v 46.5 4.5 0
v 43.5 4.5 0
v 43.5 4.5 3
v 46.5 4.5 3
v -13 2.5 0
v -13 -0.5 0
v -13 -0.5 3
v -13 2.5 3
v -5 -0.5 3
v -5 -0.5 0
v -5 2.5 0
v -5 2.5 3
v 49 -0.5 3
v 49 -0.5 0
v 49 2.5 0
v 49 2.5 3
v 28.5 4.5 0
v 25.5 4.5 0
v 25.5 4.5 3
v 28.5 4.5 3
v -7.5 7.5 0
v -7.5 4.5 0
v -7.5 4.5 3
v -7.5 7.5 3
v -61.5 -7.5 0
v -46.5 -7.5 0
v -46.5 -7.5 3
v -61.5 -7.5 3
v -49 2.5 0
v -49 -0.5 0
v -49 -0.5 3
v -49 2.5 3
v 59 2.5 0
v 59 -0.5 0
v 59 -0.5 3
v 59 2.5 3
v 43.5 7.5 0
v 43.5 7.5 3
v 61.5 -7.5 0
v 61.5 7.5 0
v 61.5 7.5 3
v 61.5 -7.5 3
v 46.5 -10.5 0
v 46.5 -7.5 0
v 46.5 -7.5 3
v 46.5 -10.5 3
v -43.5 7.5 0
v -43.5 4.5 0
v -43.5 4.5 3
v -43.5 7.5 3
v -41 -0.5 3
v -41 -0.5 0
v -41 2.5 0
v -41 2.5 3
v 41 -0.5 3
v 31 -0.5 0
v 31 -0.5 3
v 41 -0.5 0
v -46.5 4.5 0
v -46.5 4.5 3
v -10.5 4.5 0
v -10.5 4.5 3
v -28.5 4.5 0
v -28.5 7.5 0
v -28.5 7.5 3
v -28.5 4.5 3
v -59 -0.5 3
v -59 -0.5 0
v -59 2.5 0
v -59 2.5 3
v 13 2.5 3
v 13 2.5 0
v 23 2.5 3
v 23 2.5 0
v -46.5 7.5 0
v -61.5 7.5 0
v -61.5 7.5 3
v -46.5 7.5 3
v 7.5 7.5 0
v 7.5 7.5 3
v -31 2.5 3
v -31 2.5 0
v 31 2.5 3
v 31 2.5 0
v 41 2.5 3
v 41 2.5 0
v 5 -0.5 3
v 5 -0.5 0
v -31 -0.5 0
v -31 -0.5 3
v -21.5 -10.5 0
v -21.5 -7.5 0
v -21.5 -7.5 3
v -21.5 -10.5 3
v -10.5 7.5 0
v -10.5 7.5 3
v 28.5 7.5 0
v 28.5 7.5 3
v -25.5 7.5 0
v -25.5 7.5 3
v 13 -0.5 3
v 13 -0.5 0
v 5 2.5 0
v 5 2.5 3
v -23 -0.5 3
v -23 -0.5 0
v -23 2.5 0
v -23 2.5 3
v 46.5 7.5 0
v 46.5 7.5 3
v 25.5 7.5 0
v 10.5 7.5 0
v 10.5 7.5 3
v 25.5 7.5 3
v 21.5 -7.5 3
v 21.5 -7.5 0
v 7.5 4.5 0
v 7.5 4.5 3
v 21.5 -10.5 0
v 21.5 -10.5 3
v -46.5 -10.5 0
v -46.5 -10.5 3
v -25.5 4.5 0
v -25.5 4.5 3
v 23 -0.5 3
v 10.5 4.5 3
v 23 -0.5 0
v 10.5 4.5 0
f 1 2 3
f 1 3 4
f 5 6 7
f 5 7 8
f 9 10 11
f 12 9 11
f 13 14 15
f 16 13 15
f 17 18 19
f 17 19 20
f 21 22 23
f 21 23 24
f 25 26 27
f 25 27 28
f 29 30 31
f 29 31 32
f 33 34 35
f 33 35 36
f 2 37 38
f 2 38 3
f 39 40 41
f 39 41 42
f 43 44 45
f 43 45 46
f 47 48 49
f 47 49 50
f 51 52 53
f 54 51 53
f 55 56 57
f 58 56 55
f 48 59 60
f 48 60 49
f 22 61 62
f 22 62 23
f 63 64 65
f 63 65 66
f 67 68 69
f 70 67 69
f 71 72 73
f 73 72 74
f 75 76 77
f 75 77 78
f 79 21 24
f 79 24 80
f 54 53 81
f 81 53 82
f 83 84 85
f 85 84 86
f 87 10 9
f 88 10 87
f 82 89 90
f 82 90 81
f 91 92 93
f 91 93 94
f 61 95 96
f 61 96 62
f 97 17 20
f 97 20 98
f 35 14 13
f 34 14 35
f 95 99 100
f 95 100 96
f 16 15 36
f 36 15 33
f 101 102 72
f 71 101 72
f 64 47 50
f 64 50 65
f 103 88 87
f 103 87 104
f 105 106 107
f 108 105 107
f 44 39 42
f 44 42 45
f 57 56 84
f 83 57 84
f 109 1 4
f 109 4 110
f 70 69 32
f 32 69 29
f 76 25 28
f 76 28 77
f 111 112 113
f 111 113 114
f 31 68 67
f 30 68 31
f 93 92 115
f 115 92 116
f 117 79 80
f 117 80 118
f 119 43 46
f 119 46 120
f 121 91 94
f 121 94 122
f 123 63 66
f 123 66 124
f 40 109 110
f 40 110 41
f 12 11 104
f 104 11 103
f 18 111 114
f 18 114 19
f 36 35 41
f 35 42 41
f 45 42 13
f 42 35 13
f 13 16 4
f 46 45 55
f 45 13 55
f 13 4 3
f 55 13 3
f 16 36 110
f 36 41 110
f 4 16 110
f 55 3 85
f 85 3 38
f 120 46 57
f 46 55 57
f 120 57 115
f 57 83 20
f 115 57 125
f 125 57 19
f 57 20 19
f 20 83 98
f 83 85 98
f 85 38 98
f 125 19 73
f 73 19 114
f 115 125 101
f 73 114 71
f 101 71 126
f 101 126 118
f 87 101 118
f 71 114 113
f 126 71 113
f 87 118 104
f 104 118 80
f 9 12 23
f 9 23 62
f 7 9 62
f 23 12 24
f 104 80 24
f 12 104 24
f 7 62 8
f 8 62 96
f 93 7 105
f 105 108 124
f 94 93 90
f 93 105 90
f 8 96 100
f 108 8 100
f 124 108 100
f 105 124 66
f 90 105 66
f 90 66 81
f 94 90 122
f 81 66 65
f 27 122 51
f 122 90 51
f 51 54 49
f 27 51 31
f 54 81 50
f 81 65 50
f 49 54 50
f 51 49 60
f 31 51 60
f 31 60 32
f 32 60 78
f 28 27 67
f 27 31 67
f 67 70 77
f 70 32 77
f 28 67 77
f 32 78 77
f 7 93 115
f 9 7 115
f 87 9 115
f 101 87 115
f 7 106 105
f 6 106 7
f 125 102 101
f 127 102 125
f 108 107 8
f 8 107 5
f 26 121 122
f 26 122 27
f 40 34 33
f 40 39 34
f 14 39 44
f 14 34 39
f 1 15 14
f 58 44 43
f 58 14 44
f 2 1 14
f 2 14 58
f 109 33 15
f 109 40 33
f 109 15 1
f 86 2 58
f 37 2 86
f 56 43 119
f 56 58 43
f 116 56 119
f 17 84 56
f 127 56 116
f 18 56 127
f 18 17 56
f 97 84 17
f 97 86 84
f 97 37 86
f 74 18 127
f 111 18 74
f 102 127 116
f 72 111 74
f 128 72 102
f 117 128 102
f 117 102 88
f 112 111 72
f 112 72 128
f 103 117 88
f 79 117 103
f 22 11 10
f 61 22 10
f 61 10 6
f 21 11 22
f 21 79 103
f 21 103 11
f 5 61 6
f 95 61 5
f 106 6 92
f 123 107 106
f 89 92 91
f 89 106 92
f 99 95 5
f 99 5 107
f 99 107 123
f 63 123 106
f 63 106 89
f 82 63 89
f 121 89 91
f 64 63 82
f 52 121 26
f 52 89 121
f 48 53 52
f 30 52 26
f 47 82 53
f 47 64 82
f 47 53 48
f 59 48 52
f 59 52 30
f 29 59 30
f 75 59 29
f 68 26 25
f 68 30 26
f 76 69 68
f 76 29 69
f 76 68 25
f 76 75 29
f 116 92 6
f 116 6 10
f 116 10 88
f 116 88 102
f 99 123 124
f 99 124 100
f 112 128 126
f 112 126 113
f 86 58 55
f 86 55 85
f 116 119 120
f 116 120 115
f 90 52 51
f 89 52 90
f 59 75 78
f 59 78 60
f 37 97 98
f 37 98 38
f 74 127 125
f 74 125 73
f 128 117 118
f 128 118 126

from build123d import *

# Parameters (mm, degrees)
SKETCH2_W           = 10
SKETCH2_H           = 3
BOSS_EXTRUDE2_DEPTH = 3


with BuildPart() as part:
    # Sketch2 → Boss-Extrude2 (new body)
    with BuildSketch(Plane.XY):
        Polygon((-43.5, 7.5), (-28.5, 7.5), (-28.5, 4.5), (-25.5, 4.5), (-25.5, 7.5), (-10.5, 7.5), (-10.5, 4.5), (-7.5, 4.5), (-7.5, 7.5), (7.5, 7.5), (7.5, 4.5), (10.5, 4.5), (10.5, 7.5), (25.5, 7.5), (25.5, 4.5), (28.5, 4.5), (28.5, 7.5), (43.5, 7.5), (43.5, 4.5), (46.5, 4.5), (46.5, 7.5), (61.5, 7.5), (61.5, -7.5), (46.5, -7.5), (46.5, -10.5), (21.5, -10.5), (21.5, -7.5), (10, -7.5), (-10, -7.5), (-21.5, -7.5), (-21.5, -10.5), (-46.5, -10.5), (-46.5, -7.5), (-61.5, -7.5), (-61.5, 7.5), (-46.5, 7.5), (-46.5, 4.5), (-43.5, 4.5), align=None)
        with Locations((-54, 1)):
            Rectangle(SKETCH2_W, SKETCH2_H, mode=Mode.SUBTRACT)
        with Locations((-36, 1)):
            Rectangle(SKETCH2_W, SKETCH2_H, mode=Mode.SUBTRACT)
        with Locations((-18, 1)):
            Rectangle(SKETCH2_W, SKETCH2_H, mode=Mode.SUBTRACT)
        with Locations((0, 1)):
            Rectangle(SKETCH2_W, SKETCH2_H, mode=Mode.SUBTRACT)
        with Locations((18, 1)):
            Rectangle(SKETCH2_W, SKETCH2_H, mode=Mode.SUBTRACT)
        with Locations((36, 1)):
            Rectangle(SKETCH2_W, SKETCH2_H, mode=Mode.SUBTRACT)
        with Locations((54, 1)):
            Rectangle(SKETCH2_W, SKETCH2_H, mode=Mode.SUBTRACT)
    extrude(amount=BOSS_EXTRUDE2_DEPTH)


solid = part.part
